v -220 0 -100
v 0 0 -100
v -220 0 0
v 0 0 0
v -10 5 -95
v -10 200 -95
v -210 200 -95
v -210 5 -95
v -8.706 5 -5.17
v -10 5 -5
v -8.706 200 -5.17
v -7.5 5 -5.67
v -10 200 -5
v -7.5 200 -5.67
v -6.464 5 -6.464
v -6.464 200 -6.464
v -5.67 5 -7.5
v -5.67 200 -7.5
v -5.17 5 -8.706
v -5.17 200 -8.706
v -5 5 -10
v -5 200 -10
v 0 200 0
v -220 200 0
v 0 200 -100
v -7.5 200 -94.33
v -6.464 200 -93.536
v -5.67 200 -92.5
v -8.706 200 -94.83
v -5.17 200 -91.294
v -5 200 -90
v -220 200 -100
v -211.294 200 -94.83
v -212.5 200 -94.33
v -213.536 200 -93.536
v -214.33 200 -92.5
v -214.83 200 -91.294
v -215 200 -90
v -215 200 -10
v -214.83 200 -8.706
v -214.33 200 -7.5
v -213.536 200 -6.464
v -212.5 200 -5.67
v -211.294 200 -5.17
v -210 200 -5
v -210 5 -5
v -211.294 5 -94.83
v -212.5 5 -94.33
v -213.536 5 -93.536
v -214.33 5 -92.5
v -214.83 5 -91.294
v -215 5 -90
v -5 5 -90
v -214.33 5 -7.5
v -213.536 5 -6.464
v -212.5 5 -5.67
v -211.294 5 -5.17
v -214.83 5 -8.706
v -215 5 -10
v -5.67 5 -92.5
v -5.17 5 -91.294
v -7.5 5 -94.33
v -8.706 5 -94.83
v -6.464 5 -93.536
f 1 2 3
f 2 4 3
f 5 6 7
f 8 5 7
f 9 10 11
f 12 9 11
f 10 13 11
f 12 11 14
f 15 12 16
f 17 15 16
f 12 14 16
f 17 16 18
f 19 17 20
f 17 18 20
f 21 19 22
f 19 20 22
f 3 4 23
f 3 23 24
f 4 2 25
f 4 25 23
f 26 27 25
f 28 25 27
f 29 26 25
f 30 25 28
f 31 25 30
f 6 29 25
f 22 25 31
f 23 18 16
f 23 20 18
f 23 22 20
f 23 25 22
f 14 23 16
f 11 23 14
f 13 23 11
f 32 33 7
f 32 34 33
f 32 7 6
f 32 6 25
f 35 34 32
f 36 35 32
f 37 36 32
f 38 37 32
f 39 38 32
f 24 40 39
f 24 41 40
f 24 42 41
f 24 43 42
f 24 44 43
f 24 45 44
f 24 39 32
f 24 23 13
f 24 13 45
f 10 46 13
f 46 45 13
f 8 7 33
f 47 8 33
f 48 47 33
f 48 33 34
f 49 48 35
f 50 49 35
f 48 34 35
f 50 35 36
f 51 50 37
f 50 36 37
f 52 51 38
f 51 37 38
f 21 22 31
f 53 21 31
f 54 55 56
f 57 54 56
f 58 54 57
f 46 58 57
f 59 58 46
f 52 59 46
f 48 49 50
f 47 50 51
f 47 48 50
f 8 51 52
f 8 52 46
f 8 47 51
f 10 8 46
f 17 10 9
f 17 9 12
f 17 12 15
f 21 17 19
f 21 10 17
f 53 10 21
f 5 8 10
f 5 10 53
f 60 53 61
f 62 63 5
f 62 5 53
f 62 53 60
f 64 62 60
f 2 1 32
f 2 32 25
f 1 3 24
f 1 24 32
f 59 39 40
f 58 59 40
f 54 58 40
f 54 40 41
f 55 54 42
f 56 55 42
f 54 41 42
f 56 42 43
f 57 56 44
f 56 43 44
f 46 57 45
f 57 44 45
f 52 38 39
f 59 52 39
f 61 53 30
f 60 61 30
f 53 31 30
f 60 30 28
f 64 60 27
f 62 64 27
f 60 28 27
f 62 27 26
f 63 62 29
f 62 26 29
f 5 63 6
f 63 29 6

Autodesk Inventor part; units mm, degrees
ref_plane "YZ Plane" through (0, 0, 0) normal (1, 0, 0) x (0, 1, 0)
ref_plane "XZ Plane" through (0, 0, 0) normal (0, 1, 0) x (-1, 0, 0)
ref_plane "XY Plane" through (0, 0, 0) normal (0, 0, 1) x (1, 0, 0)
sketch "Sketch1" plane through (0, 0, 0) normal (0, 1, 0) x (-1, 0, 0)
  line L0 (0, 0) -> (220, 0)
  line L1 (220, 0) -> (220, -100)
  line L2 (220, -100) -> (0, -100)
  line L3 (0, -100) -> (0, 0)
  dimension "d0" = 220
  dimension "d1" = 100
extrude "Extrusion1" add sketch "Sketch1" along normal blind 200
sketch "Sketch2" plane through (0, 200, 0) normal (0, 1, 0) x (1, 0, 0)
  line L0 (-210, 5) -> (-10, 5)
  line L1 (-5, 10) -> (-5, 90)
  line L2 (-10, 95) -> (-210, 95)
  line L3 (-215, 90) -> (-215, 10)
  line L4 (-220, 100) -> (-220, 0) projected
  line L5 (0, 0) -> (0, 100) projected
  arc A0 (-210, 95) -> (-215, 90) centre (-210, 90) ccw
  arc A1 (-5, 90) -> (-10, 95) centre (-10, 90) ccw
  arc A2 (-10, 5) -> (-5, 10) centre (-10, 10) ccw
  arc A3 (-215, 10) -> (-210, 5) centre (-210, 10) ccw
  point P0 (-215, 5)
  point P1 (-5, 95)
  point P2 (-5, 5)
  point P3 (-215, 95)
  dimension "d4" = 5
  dimension "d5" = 5
  dimension "d6" = 5
  dimension "d7" = 5
  dimension "d8" = 5
extrude "Extrusion2" cut sketch "Sketch2" against normal blind 195
properties part number "balde"
